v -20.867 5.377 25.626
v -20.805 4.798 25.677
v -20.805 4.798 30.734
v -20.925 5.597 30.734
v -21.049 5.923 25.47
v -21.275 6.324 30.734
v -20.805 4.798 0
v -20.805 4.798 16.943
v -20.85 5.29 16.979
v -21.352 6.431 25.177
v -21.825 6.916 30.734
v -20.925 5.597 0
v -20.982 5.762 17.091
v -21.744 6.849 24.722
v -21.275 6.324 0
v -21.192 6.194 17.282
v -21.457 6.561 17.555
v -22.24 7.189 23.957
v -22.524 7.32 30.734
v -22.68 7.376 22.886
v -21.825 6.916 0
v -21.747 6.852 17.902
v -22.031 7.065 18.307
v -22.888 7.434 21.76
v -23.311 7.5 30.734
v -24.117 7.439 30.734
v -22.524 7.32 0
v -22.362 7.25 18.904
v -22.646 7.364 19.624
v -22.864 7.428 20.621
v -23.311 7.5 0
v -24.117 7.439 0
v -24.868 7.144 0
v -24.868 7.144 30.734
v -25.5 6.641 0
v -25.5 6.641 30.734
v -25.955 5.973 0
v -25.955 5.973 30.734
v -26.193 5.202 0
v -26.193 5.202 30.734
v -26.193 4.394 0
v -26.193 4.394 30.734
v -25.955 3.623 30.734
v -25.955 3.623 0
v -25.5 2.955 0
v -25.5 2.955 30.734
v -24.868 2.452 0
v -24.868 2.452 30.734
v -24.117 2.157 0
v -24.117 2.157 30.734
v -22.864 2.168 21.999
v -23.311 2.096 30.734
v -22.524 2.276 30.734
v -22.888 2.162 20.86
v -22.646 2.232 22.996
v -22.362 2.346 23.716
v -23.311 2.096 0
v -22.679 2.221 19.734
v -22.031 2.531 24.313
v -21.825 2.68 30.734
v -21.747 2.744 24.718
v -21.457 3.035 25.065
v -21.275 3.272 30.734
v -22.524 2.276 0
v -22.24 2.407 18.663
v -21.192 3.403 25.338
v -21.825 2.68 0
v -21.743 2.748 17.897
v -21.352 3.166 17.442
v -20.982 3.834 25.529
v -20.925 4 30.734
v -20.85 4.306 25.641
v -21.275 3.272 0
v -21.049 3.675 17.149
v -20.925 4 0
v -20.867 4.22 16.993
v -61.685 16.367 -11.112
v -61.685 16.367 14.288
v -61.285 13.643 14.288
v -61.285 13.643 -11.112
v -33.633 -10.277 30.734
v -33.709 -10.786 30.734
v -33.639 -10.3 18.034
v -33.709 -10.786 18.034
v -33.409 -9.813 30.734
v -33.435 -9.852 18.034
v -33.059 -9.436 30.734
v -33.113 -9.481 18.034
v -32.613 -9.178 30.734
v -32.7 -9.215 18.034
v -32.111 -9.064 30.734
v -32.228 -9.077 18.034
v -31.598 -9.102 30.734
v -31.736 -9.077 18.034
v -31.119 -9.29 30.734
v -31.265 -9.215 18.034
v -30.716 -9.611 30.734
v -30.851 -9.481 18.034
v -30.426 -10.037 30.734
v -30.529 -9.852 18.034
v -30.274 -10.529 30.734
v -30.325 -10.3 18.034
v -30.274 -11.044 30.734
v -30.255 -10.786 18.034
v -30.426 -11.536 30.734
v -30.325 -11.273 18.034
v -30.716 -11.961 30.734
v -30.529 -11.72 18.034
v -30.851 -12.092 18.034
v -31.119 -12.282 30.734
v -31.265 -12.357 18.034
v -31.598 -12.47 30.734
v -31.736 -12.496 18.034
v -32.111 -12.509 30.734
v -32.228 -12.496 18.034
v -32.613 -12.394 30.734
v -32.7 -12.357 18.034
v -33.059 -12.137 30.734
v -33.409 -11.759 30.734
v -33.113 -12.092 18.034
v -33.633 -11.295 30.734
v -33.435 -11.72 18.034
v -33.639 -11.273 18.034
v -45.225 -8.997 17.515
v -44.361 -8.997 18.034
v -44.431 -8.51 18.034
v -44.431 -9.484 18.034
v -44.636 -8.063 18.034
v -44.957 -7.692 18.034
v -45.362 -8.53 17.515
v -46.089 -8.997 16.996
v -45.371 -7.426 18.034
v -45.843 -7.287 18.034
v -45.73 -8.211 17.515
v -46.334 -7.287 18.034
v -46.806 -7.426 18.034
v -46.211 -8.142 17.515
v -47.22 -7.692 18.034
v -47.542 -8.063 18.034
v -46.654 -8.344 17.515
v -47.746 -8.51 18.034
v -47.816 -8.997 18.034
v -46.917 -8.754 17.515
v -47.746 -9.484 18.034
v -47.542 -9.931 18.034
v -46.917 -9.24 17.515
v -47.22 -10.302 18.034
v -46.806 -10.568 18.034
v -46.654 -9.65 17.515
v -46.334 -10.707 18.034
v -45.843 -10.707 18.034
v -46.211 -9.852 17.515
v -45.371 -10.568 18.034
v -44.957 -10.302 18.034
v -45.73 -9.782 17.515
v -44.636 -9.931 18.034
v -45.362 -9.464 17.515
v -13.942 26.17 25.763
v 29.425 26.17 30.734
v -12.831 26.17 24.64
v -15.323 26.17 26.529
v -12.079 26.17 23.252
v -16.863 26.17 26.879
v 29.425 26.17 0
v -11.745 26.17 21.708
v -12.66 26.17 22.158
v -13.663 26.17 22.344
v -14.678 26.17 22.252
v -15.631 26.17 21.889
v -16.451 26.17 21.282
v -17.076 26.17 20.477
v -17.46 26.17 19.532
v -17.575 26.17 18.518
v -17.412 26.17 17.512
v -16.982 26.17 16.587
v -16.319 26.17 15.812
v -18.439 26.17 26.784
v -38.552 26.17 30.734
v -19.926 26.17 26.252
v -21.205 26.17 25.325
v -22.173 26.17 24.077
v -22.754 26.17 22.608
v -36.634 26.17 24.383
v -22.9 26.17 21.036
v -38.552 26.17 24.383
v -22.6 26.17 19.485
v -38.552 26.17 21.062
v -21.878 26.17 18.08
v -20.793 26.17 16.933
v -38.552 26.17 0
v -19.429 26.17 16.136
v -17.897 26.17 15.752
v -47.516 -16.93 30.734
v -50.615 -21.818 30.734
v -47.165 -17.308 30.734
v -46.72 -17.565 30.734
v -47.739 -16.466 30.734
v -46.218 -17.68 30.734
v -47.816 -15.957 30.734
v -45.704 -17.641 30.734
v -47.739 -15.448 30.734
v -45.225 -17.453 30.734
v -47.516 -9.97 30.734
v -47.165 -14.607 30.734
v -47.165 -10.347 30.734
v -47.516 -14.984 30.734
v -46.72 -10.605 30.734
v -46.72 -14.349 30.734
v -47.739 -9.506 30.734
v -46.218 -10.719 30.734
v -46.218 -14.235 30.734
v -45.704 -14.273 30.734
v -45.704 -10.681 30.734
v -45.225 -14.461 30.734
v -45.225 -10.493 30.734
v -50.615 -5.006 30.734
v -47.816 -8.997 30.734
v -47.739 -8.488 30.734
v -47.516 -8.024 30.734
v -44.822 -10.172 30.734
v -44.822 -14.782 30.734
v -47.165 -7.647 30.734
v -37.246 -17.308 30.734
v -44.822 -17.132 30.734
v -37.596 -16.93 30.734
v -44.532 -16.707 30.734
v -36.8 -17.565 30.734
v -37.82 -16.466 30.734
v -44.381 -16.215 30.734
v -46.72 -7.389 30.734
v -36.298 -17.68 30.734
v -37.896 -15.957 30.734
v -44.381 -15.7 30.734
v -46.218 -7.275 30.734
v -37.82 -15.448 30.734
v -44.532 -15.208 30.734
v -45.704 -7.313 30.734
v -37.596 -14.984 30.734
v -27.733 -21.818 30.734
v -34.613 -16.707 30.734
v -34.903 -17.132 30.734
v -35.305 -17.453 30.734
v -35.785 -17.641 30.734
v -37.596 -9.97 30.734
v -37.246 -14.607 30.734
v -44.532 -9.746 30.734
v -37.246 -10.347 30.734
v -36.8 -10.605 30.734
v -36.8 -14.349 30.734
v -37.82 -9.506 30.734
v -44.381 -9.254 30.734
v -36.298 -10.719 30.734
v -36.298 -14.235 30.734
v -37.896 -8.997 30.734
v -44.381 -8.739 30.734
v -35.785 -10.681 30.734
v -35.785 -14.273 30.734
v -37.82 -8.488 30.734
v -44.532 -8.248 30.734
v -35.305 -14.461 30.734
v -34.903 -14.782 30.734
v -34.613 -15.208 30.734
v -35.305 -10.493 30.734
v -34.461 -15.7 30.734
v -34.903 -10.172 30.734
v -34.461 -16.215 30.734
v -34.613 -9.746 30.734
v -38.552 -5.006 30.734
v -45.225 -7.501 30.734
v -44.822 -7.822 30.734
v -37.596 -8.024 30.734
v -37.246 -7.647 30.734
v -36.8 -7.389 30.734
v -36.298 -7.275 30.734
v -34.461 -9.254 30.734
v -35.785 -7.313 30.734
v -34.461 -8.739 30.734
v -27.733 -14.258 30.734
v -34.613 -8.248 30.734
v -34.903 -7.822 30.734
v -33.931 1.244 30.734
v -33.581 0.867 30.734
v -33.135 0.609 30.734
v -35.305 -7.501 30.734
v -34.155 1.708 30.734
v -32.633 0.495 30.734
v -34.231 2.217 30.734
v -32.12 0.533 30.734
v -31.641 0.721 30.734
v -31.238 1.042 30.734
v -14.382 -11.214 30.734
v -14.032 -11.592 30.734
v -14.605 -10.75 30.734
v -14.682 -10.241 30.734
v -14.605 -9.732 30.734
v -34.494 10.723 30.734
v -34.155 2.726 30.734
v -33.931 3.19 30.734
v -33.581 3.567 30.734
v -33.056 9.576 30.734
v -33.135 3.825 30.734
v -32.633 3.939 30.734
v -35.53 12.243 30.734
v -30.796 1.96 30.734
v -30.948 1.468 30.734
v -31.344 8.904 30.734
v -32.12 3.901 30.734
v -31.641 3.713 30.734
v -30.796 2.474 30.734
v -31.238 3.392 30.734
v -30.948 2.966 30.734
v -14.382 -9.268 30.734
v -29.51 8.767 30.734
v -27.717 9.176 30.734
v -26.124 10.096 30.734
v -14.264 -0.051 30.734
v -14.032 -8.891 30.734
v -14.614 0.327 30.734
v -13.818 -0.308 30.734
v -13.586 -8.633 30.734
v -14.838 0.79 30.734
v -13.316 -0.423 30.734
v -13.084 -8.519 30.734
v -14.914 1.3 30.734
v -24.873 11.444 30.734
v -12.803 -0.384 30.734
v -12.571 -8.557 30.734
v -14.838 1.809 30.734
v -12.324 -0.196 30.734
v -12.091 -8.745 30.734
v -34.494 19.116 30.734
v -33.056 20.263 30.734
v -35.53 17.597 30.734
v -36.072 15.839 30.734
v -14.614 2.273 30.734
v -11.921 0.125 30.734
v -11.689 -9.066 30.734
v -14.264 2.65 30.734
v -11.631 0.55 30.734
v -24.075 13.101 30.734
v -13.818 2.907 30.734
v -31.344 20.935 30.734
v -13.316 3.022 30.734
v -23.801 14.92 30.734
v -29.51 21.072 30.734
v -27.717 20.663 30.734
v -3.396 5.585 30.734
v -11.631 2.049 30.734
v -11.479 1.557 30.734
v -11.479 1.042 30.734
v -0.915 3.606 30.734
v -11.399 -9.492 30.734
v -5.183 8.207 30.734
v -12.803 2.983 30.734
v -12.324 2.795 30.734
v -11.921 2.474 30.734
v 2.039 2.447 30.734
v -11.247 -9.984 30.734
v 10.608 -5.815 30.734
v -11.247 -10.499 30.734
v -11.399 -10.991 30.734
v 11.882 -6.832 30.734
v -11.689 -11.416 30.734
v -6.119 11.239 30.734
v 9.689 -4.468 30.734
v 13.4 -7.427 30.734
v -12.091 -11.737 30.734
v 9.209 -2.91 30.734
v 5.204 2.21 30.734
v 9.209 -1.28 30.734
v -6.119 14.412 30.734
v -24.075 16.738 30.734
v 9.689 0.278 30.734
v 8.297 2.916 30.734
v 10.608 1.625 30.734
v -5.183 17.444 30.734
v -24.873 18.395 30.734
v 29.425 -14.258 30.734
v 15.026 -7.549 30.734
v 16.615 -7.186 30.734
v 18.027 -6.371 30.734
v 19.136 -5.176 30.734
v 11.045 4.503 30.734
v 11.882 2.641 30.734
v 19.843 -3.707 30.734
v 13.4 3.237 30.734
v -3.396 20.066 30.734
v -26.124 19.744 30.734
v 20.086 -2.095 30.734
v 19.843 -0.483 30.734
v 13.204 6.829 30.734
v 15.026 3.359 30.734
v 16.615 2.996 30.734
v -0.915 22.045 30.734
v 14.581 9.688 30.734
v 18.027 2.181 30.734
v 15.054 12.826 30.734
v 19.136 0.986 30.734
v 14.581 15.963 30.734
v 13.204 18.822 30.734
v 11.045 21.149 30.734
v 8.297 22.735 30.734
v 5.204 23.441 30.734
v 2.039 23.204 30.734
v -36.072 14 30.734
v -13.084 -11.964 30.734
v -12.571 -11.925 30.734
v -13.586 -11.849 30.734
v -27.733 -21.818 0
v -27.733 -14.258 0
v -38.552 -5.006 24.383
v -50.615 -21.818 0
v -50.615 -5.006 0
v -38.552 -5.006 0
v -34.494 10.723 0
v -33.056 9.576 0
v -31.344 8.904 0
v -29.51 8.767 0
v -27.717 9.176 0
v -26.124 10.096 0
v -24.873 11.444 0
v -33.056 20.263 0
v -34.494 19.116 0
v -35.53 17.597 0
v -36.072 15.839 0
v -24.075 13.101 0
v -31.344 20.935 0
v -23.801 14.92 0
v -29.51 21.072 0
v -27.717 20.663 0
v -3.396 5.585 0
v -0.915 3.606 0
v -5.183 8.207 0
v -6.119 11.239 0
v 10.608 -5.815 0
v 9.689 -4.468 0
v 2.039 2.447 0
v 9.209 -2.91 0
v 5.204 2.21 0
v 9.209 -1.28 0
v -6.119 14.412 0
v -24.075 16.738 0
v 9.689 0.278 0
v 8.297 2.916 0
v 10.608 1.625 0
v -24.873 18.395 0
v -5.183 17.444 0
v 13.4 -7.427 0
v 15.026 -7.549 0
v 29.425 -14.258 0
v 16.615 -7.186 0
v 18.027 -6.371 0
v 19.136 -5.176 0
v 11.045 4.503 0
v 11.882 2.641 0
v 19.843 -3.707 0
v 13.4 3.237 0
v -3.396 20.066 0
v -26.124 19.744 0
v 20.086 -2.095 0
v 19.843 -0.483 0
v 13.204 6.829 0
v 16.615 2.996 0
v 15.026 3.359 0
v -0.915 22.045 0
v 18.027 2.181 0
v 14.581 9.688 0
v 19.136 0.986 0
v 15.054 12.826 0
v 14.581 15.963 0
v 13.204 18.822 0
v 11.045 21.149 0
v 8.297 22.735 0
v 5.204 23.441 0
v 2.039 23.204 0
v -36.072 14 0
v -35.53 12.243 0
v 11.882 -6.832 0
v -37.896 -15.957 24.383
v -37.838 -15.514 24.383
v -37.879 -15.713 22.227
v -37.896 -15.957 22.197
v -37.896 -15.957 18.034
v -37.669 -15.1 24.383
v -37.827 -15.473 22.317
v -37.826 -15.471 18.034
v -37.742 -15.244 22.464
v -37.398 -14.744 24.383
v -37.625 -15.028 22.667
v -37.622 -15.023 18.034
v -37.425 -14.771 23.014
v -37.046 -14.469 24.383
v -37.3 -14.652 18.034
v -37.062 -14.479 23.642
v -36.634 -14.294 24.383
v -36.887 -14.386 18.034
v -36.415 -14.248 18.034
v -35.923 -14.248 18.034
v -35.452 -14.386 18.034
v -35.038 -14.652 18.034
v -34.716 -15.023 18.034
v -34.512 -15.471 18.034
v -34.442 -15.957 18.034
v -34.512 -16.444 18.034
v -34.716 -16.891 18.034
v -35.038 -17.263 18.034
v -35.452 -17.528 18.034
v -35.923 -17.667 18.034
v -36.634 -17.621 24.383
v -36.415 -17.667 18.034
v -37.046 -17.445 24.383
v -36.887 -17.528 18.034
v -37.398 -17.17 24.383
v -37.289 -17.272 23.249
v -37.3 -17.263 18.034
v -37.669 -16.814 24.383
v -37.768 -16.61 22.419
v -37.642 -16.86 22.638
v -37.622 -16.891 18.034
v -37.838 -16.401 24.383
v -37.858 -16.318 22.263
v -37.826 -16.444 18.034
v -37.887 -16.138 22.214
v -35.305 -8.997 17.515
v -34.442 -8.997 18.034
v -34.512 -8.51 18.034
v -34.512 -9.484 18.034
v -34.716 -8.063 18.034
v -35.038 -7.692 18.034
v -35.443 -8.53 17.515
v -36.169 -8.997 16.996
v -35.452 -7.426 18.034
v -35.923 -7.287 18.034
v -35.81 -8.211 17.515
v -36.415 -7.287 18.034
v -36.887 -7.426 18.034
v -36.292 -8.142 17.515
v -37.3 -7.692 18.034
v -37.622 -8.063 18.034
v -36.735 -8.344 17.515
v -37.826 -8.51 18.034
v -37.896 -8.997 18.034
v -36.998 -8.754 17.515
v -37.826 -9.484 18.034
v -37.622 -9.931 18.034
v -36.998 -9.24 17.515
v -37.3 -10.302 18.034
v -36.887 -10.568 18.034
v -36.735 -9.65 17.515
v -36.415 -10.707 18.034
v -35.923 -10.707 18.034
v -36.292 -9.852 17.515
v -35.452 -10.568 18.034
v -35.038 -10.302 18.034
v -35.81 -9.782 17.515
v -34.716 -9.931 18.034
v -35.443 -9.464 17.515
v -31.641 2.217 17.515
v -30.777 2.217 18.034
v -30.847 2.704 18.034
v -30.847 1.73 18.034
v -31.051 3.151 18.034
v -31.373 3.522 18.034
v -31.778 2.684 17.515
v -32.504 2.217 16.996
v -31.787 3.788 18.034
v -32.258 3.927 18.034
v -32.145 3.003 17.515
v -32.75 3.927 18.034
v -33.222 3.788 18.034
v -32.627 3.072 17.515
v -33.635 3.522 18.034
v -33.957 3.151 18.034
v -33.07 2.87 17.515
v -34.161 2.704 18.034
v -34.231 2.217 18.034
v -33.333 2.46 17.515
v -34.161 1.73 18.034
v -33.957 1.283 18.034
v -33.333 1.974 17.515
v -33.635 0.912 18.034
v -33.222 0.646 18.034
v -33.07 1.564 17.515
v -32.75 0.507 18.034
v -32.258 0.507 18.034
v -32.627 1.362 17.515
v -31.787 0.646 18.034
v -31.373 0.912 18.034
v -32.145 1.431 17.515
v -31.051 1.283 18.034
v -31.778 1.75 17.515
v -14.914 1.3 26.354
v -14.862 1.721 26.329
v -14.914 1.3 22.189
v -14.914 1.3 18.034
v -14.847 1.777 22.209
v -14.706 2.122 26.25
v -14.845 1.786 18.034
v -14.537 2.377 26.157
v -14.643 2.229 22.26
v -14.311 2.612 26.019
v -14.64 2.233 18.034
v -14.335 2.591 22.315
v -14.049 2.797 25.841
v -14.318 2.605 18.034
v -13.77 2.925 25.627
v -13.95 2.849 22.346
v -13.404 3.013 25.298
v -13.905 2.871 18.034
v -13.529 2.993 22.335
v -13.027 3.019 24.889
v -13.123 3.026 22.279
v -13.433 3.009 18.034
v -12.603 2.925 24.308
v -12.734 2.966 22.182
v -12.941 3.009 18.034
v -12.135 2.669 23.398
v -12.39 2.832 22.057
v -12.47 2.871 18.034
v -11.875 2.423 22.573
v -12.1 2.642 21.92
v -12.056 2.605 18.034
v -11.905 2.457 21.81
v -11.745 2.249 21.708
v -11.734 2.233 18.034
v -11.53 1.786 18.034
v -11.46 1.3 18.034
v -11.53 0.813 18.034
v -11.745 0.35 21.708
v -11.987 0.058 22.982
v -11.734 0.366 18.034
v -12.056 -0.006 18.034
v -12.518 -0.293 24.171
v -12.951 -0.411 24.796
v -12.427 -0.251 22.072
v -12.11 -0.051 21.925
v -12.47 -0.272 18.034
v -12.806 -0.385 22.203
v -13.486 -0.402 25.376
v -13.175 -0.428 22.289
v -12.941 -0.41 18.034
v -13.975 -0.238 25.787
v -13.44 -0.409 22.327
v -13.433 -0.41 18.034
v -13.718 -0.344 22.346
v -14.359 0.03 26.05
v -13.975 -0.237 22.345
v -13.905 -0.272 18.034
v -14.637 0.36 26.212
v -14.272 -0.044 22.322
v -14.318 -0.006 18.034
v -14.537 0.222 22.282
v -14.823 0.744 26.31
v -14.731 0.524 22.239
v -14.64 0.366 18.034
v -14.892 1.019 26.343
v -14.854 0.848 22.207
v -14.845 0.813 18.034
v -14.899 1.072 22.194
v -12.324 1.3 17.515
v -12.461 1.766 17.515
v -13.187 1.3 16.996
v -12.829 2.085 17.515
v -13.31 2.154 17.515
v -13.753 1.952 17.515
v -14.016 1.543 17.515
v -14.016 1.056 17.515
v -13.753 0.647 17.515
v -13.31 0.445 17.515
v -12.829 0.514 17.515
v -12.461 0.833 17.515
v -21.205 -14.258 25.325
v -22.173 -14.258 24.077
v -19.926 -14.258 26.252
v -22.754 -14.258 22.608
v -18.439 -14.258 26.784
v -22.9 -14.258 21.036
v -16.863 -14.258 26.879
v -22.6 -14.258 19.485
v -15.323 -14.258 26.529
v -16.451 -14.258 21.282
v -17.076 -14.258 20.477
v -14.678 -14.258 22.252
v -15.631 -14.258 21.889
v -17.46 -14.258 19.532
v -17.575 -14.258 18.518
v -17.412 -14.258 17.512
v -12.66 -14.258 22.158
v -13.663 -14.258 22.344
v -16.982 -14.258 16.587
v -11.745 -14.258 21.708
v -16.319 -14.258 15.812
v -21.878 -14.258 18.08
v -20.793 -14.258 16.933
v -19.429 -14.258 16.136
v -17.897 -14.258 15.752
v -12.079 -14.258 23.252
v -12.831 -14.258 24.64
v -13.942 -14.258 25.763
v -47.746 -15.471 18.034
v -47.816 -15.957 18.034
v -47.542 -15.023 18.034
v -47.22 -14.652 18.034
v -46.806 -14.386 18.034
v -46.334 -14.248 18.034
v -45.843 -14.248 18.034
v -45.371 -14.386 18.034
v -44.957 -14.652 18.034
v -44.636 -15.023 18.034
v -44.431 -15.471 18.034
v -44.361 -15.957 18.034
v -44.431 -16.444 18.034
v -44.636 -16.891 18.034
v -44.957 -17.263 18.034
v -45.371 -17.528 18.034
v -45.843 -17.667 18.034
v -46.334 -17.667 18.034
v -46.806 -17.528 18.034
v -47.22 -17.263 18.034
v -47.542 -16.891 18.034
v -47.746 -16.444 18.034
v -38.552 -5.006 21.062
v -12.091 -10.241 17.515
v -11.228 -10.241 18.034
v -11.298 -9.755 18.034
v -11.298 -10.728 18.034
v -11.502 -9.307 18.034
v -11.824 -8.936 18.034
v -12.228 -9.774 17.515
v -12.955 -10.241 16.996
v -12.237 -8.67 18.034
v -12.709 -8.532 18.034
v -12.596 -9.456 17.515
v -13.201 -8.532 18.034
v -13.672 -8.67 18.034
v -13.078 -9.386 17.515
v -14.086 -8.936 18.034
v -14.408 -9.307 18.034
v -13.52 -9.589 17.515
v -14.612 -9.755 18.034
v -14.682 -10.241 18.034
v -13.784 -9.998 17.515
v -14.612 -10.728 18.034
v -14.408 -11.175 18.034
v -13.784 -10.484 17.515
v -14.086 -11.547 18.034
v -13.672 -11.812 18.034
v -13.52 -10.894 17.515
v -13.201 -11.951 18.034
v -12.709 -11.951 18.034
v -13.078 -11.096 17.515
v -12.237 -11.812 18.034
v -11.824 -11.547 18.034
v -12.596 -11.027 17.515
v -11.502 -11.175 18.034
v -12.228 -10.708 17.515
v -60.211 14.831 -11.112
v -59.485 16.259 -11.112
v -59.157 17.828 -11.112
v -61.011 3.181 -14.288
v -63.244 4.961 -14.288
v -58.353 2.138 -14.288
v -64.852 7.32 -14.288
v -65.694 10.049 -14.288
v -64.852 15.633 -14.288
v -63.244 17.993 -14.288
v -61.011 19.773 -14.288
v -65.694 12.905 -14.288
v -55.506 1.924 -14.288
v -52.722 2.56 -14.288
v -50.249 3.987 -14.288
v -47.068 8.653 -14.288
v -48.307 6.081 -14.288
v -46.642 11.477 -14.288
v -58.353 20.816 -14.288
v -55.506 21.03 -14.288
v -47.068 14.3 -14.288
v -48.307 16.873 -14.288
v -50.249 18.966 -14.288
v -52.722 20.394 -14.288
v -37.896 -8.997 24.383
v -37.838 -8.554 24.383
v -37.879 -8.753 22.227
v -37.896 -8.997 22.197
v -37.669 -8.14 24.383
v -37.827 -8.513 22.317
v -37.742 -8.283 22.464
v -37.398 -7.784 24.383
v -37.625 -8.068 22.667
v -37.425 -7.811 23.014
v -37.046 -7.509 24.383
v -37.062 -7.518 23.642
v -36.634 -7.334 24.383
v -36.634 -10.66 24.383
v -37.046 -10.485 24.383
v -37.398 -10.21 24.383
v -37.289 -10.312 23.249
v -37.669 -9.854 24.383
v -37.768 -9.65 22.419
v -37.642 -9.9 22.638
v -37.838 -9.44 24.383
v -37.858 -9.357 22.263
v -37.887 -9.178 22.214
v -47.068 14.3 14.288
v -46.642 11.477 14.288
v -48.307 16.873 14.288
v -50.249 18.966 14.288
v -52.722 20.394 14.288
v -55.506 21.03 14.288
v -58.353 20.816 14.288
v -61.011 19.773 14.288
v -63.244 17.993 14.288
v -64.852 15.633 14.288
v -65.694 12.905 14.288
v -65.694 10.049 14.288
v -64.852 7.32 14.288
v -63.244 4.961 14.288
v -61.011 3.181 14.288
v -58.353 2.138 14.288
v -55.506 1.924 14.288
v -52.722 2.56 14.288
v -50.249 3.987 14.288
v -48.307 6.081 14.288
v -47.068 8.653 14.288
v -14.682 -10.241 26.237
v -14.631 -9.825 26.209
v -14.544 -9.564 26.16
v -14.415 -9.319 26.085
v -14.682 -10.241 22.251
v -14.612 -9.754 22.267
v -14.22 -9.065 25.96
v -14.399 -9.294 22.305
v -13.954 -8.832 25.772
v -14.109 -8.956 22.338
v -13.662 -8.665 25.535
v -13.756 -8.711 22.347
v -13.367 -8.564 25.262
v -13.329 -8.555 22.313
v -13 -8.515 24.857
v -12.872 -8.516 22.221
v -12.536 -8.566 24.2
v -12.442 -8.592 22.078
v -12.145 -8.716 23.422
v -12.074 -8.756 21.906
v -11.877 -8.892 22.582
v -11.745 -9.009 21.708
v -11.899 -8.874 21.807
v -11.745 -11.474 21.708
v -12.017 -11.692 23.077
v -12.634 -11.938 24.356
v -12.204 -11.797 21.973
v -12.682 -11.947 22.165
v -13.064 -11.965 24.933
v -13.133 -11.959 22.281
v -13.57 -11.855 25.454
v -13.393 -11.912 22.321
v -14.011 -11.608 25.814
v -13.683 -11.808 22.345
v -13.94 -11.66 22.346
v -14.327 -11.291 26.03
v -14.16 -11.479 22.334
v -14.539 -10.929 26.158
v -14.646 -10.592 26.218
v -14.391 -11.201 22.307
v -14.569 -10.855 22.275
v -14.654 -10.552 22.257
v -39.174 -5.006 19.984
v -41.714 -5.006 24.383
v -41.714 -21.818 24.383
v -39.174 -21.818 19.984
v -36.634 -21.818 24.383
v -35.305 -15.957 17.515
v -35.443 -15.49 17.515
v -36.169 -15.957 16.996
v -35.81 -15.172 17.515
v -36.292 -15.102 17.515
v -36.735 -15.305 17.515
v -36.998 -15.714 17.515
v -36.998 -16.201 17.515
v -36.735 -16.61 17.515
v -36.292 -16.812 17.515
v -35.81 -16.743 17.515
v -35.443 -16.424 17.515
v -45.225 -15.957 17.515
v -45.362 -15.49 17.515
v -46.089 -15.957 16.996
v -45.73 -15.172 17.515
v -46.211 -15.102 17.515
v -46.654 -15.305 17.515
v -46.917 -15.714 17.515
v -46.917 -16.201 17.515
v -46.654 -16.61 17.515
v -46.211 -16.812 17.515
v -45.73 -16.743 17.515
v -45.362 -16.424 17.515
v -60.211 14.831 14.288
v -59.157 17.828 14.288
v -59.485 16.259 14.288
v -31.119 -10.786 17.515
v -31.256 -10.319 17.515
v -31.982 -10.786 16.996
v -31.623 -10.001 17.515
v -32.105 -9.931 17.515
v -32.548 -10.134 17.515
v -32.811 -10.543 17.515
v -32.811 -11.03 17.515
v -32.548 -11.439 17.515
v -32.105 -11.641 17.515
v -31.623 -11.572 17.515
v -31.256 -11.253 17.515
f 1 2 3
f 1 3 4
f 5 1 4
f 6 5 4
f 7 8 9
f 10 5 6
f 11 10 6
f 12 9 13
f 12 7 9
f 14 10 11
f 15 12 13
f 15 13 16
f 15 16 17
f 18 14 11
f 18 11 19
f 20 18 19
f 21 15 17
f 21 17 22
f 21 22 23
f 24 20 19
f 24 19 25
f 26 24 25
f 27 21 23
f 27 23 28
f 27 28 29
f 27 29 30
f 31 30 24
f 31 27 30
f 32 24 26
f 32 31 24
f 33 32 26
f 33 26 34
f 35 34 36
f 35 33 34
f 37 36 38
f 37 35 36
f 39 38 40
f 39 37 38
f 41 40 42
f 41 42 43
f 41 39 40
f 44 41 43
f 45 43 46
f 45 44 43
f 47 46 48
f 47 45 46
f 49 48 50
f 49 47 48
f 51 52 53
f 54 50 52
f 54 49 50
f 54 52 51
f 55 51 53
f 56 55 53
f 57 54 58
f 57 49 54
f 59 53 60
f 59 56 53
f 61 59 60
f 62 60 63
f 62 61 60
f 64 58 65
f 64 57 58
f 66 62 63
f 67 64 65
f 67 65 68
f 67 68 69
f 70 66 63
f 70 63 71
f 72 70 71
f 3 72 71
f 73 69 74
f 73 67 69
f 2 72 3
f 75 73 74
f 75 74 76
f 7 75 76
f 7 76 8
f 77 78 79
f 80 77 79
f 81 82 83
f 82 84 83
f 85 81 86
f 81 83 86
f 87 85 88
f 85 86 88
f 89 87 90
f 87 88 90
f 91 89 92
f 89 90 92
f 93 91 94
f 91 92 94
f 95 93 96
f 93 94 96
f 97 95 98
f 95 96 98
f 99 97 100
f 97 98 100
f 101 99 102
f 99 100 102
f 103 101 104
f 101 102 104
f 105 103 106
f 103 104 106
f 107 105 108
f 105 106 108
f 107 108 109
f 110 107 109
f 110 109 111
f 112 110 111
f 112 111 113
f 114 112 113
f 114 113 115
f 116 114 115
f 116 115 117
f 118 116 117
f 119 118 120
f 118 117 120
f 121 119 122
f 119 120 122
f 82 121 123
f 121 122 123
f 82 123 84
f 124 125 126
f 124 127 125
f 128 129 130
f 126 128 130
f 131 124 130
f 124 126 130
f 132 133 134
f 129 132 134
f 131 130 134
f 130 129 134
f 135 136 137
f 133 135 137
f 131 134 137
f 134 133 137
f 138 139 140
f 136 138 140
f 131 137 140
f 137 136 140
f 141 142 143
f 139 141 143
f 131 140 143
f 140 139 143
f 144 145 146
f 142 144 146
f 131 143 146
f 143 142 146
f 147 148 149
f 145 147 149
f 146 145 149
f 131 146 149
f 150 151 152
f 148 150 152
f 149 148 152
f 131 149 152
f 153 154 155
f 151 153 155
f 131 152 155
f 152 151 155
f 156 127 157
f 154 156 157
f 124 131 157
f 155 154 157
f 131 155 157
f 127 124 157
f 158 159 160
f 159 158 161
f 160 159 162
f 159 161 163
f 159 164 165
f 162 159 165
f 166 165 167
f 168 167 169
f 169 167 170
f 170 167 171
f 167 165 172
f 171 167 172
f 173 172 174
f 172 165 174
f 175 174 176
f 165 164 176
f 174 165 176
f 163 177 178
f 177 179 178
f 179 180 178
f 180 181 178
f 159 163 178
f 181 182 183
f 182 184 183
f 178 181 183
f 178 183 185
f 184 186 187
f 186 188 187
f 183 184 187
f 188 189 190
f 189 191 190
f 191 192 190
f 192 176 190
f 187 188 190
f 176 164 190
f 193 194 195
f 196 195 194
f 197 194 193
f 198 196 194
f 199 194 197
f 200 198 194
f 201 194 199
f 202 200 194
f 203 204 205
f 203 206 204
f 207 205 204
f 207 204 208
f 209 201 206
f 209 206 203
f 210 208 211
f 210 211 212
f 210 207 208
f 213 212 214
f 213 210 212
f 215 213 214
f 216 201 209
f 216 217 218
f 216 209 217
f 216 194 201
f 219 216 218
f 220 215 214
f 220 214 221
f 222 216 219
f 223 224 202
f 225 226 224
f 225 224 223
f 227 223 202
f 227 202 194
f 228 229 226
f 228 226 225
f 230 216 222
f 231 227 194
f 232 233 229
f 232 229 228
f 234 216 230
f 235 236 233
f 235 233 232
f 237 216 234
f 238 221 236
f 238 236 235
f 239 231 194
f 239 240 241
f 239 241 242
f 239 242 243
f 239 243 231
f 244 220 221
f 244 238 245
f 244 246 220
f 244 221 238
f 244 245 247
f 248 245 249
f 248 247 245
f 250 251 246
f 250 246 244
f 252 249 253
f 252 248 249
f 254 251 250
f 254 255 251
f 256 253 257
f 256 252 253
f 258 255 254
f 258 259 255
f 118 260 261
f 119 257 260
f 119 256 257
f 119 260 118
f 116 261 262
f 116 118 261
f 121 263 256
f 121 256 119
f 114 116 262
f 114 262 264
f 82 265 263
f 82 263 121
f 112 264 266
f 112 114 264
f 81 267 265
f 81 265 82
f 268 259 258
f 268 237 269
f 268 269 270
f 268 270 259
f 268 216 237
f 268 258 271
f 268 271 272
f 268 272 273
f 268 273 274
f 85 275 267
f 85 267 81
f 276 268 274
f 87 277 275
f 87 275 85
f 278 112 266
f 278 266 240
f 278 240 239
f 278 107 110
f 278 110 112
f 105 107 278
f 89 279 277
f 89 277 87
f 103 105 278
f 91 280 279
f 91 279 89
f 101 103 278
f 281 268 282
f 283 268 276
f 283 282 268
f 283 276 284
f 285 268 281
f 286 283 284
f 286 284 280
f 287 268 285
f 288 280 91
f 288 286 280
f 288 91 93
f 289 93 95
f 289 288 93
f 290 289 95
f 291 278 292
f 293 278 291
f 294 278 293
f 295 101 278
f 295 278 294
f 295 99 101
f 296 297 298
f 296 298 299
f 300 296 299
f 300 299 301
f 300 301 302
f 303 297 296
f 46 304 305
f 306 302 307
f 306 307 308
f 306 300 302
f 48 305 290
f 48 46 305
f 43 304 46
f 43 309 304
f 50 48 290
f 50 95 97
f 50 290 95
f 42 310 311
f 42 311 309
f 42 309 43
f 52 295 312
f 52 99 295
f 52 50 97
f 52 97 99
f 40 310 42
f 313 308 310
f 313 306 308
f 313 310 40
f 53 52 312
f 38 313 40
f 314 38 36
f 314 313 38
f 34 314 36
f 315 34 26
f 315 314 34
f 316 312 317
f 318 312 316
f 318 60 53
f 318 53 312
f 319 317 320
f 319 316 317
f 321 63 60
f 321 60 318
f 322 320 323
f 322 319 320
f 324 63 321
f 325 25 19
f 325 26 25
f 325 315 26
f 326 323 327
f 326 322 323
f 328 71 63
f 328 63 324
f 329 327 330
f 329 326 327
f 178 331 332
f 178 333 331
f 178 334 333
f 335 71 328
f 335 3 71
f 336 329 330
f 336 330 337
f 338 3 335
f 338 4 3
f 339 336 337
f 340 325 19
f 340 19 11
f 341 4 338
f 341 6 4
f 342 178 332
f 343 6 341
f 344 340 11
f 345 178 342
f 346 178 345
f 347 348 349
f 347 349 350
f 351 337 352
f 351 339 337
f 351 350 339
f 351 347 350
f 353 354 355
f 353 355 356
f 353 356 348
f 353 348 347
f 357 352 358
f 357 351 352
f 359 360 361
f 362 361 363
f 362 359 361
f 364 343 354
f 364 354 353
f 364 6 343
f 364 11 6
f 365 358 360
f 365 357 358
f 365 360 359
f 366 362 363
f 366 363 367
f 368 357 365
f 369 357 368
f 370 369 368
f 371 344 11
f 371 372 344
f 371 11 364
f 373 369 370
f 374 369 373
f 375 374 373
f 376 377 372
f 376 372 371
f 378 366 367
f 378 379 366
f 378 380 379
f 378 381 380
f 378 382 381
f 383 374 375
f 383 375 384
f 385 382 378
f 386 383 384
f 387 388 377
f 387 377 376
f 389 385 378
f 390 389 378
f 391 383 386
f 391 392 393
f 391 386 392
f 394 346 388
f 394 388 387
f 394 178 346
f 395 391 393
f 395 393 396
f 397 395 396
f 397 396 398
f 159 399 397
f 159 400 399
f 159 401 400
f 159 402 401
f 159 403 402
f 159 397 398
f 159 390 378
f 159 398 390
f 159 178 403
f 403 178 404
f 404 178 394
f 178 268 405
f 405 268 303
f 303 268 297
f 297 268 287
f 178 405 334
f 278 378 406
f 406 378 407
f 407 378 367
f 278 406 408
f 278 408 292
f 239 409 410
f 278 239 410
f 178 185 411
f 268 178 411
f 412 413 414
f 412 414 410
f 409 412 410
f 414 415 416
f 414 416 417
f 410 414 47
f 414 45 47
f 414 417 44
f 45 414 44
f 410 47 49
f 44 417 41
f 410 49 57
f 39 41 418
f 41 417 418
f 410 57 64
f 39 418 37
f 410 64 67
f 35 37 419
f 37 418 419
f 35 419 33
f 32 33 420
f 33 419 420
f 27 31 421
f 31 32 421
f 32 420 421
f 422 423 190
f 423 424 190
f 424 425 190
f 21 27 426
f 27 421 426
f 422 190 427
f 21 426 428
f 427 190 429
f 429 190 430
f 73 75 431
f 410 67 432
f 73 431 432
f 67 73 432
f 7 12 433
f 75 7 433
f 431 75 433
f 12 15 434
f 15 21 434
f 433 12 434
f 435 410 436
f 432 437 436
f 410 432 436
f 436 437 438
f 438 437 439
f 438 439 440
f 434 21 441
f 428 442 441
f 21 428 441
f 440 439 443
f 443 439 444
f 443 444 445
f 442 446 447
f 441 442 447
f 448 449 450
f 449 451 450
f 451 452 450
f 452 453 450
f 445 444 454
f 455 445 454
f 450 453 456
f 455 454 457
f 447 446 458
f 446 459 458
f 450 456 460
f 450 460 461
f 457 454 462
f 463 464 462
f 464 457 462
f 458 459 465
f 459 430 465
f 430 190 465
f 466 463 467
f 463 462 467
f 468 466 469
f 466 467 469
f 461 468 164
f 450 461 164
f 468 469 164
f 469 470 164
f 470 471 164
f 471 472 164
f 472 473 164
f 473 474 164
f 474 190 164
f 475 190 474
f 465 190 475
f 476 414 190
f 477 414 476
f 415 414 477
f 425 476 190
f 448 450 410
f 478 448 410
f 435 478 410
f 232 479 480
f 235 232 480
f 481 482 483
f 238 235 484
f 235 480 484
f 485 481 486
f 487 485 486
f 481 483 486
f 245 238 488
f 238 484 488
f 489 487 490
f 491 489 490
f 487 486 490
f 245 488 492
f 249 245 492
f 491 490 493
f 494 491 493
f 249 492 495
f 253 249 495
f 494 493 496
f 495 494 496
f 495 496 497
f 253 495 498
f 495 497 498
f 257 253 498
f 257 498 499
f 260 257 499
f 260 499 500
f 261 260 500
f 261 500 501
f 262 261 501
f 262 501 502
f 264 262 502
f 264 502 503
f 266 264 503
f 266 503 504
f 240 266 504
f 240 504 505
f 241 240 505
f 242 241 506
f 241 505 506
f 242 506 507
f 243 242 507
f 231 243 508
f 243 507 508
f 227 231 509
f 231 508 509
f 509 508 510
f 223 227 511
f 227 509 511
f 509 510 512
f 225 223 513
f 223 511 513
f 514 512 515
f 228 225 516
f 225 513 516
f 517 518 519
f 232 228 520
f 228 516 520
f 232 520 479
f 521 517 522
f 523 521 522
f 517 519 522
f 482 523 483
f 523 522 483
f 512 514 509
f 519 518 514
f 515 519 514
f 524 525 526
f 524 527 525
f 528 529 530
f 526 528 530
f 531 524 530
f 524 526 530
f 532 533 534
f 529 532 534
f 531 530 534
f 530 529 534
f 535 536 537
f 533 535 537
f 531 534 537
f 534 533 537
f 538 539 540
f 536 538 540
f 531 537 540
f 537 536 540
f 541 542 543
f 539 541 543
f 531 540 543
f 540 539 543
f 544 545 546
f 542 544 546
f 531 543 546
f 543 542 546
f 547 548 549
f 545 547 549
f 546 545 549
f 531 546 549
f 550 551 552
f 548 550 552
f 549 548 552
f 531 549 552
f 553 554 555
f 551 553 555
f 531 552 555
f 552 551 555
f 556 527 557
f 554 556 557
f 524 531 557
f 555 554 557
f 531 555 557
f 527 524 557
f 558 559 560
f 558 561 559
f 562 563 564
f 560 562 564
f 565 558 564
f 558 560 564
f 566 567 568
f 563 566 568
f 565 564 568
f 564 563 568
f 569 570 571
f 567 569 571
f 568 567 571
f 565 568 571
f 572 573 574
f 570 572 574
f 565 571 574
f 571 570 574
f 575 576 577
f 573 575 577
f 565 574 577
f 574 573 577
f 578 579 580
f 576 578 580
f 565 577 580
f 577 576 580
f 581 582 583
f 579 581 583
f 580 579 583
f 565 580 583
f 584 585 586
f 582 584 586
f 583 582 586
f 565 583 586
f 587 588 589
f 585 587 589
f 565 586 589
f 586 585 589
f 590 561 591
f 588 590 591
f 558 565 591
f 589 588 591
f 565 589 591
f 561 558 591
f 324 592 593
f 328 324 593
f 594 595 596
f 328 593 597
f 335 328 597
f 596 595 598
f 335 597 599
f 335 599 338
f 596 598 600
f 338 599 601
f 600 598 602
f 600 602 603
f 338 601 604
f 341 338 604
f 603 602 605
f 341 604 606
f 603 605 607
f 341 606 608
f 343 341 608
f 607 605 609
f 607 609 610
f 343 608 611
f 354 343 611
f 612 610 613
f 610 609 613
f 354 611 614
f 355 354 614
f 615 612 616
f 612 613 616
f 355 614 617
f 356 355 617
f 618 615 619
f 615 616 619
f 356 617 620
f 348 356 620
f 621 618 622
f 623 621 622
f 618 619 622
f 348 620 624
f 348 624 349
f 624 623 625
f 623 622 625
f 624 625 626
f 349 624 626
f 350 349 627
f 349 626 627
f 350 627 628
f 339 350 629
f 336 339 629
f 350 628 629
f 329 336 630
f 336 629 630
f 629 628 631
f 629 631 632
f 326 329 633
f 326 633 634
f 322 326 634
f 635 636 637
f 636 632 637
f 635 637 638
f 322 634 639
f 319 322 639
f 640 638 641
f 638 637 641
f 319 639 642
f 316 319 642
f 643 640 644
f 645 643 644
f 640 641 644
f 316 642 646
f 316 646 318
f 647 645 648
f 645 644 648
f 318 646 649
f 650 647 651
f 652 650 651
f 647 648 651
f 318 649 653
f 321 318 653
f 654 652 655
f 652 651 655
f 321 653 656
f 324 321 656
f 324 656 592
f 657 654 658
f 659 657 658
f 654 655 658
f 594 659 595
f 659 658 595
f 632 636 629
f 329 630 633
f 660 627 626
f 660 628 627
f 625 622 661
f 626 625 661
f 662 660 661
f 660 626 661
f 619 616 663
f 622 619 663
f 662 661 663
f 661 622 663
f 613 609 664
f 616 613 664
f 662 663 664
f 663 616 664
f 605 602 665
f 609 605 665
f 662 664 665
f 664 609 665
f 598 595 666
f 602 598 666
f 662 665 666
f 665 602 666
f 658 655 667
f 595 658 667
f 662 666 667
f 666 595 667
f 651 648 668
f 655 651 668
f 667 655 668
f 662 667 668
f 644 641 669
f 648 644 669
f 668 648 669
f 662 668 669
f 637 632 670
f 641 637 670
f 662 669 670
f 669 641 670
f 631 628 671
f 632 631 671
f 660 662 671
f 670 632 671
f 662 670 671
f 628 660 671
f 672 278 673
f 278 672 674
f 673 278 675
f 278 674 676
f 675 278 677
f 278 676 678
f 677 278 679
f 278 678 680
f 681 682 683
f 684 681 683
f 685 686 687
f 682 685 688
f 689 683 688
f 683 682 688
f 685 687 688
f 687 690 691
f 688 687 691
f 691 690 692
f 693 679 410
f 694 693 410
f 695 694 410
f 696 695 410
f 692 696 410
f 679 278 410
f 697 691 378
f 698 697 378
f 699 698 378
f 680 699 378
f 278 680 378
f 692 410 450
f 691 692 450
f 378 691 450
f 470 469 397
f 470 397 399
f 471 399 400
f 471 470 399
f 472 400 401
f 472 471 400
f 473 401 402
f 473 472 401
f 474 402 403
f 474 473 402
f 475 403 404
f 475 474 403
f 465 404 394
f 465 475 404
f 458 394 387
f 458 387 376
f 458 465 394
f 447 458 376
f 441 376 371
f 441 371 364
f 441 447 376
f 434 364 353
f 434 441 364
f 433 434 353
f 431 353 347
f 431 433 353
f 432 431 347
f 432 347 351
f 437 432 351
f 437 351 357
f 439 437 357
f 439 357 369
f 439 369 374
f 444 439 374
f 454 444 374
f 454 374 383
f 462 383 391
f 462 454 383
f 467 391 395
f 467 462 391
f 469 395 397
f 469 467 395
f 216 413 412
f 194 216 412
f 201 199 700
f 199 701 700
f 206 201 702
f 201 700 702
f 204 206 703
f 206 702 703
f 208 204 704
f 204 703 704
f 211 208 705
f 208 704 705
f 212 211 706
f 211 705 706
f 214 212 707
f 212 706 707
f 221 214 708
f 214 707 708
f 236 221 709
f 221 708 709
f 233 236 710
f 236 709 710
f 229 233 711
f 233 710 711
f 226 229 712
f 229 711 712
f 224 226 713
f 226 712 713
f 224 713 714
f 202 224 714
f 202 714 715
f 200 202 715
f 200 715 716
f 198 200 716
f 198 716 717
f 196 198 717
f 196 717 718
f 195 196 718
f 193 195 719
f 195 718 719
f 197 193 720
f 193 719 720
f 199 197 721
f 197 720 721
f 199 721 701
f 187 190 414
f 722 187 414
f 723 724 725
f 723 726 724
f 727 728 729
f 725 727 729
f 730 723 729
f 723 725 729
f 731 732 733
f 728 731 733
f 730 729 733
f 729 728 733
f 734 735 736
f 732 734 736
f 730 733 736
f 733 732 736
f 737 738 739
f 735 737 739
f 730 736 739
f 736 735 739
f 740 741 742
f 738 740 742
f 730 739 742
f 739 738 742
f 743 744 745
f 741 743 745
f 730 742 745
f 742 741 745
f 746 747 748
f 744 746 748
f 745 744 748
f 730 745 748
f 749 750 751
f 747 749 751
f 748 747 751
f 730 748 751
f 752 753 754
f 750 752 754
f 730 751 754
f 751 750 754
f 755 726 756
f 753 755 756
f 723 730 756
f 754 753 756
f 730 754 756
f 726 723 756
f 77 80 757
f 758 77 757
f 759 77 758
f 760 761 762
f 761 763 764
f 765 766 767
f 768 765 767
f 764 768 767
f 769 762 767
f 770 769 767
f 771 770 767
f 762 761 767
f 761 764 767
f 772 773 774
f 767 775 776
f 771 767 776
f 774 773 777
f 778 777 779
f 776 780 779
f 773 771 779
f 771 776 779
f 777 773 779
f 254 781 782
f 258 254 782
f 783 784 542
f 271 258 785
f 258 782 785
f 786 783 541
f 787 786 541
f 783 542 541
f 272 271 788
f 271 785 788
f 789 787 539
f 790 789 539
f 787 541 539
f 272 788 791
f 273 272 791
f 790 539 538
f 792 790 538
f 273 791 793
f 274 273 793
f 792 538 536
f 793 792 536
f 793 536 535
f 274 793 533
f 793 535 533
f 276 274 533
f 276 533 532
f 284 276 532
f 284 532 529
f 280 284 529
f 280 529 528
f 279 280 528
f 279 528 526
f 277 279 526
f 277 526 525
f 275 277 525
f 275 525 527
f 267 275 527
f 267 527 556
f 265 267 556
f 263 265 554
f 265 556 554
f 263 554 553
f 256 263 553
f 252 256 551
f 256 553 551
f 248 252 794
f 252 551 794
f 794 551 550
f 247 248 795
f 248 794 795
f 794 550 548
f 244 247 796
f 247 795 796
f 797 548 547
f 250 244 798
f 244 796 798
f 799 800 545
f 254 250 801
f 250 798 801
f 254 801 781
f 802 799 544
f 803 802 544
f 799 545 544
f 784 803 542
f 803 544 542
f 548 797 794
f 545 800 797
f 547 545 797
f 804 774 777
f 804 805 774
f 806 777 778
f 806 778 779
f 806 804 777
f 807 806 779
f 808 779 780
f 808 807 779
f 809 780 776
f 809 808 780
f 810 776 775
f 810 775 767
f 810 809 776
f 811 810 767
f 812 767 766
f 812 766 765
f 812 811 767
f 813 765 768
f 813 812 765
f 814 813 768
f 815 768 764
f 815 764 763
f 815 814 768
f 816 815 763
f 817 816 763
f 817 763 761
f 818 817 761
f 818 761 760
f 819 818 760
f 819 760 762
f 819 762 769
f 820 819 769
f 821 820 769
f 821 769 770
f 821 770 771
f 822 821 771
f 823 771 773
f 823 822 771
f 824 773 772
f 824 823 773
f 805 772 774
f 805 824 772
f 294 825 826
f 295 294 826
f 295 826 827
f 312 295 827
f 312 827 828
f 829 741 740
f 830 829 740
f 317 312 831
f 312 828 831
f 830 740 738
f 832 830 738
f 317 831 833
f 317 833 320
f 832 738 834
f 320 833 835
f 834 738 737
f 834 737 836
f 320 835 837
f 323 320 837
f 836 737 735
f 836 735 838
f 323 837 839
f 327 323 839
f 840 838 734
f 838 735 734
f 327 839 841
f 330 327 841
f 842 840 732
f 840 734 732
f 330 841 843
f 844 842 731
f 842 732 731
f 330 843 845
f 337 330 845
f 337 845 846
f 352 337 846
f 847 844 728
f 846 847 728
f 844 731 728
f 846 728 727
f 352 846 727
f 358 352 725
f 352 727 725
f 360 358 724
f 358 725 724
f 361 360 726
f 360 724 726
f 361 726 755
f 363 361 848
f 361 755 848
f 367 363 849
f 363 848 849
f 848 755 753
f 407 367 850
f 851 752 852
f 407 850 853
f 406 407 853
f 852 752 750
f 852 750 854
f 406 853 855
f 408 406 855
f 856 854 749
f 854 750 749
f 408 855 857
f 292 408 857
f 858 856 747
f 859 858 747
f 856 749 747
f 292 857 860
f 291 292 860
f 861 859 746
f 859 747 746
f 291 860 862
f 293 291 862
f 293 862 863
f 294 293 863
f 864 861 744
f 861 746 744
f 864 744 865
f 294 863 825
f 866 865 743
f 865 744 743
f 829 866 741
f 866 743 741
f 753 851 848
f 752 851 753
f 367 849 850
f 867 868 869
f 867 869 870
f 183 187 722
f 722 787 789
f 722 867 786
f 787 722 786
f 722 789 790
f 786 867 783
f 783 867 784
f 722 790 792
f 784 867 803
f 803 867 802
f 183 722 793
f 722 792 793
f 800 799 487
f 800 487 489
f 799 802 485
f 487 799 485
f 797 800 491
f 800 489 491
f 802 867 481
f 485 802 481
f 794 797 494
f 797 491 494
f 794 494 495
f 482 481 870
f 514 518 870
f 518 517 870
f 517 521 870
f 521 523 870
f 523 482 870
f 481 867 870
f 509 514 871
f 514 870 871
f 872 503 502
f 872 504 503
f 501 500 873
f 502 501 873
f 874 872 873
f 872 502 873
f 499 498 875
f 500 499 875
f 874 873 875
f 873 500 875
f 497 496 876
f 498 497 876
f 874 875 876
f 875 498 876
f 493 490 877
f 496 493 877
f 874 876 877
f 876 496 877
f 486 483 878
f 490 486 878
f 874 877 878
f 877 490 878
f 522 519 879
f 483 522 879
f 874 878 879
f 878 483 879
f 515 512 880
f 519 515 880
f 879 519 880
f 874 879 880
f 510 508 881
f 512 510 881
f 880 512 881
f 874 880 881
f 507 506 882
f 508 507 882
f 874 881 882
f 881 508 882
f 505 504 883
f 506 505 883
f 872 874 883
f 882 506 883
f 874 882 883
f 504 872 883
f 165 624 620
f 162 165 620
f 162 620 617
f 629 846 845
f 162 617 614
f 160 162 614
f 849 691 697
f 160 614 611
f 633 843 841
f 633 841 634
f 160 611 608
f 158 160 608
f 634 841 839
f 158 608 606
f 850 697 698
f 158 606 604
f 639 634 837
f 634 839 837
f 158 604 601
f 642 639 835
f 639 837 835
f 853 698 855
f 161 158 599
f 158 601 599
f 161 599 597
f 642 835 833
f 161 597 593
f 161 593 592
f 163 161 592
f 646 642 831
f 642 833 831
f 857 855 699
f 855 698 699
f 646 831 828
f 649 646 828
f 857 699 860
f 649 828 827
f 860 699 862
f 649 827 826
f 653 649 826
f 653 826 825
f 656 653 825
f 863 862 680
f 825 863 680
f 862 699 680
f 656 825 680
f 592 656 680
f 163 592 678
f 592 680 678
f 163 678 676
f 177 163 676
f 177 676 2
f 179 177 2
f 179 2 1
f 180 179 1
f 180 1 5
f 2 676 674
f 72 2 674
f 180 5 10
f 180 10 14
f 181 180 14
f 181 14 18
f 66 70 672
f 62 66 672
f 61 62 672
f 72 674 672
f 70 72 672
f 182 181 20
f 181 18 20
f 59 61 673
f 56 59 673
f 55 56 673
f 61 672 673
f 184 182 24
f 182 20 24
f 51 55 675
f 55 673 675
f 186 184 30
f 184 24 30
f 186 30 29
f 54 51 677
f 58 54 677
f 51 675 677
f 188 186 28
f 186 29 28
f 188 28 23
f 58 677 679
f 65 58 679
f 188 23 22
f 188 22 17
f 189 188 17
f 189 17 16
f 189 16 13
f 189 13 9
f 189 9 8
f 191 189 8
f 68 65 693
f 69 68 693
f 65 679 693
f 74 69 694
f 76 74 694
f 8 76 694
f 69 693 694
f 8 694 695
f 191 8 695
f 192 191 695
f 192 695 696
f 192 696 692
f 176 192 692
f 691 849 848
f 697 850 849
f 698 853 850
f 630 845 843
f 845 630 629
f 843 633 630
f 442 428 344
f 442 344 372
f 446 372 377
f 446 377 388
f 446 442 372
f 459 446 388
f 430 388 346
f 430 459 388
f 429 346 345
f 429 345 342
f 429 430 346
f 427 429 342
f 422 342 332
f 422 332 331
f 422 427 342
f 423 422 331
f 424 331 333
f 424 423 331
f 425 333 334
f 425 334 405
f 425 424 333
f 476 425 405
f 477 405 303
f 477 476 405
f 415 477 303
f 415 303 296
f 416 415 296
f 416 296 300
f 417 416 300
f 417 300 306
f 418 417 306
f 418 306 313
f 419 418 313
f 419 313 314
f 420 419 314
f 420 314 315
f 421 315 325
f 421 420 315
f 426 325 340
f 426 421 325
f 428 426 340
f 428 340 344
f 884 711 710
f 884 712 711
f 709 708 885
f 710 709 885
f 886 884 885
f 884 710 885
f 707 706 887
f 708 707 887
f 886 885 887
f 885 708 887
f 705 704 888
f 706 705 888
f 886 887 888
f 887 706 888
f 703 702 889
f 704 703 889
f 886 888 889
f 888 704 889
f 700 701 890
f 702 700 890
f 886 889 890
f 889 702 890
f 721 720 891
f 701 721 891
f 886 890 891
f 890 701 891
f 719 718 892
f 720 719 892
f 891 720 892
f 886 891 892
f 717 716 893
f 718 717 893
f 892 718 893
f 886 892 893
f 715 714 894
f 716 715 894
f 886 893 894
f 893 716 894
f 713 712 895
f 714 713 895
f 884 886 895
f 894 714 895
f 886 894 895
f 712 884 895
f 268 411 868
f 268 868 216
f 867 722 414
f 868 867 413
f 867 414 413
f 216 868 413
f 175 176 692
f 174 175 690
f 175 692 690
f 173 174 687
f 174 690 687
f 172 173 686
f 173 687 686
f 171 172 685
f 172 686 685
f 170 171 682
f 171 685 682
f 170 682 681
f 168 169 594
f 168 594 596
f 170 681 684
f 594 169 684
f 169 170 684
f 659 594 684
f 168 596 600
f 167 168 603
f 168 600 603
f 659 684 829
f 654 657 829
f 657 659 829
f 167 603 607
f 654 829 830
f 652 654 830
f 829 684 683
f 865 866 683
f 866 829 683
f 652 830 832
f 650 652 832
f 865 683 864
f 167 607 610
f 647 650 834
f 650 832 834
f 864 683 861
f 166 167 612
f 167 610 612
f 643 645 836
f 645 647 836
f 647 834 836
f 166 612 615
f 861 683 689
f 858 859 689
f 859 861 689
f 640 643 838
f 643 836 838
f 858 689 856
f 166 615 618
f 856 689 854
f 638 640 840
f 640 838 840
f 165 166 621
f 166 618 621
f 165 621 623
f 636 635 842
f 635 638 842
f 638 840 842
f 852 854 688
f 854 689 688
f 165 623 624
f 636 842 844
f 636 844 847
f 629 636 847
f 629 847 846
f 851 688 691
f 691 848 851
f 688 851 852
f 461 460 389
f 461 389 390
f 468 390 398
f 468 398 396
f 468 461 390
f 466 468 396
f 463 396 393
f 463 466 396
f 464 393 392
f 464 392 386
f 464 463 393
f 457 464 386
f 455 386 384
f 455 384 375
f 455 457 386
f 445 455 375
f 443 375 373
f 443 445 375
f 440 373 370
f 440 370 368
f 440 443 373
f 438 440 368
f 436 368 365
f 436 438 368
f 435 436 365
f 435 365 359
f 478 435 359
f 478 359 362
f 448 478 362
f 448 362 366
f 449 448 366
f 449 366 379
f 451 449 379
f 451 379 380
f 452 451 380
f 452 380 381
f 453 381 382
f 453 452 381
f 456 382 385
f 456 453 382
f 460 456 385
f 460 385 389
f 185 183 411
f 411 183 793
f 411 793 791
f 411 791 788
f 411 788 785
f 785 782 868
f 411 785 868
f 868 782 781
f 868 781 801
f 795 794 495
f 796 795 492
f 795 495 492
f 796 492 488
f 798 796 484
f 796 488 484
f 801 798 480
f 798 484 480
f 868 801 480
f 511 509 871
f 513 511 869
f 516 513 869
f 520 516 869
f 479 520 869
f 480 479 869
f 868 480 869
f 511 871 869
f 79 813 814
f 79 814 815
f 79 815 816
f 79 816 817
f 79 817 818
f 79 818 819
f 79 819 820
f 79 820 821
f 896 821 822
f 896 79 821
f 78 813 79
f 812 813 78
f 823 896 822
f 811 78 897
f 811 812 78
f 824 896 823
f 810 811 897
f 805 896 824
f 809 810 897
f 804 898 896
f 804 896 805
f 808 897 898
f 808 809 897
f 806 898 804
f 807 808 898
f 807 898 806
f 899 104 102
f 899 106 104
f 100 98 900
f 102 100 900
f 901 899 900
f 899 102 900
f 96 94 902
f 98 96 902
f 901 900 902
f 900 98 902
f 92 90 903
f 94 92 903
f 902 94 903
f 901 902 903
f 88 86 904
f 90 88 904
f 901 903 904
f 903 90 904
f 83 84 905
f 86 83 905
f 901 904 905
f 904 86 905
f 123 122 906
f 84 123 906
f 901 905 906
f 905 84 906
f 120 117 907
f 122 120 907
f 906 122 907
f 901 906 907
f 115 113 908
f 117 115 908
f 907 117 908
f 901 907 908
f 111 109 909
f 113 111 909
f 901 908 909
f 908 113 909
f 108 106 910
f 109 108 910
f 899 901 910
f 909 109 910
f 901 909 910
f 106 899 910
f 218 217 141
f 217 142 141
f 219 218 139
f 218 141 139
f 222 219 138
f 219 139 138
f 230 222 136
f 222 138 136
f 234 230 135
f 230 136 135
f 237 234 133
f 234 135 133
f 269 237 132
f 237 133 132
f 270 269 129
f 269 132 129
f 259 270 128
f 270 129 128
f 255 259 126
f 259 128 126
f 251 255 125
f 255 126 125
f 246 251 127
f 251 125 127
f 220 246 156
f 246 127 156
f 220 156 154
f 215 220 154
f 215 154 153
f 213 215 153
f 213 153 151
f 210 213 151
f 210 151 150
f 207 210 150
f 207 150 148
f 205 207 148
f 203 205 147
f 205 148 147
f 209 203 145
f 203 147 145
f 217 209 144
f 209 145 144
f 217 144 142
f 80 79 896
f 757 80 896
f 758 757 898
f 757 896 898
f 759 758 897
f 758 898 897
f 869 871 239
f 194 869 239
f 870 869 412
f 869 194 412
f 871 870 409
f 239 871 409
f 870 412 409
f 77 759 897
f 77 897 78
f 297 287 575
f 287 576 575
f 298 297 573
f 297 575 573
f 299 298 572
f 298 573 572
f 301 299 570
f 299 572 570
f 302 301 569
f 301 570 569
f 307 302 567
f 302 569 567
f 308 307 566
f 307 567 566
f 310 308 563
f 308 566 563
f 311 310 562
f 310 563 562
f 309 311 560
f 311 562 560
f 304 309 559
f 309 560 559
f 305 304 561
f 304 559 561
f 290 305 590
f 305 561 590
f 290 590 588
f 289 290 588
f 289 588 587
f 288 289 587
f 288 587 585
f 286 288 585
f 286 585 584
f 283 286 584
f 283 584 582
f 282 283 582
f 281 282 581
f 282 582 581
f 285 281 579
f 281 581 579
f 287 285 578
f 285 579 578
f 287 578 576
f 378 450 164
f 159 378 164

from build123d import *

# Parameters (mm, degrees)
F0_R      = 5.4693390269
F0_R_2    = 2.7091456529
F0_R_3    = 6.1699110027
F0_R_4    = 10.6455543831
F1_DEPTH  = 30.734
F3_DEPTH  = 47.9885970632
F5_DEPTH  = 40.4286065528
F6_R      = 9.5794837086
F7_DEPTH  = 14.2875
F9_DEPTH  = 25.4
F11_D     = 3.4544
F11_DEPTH = 12.7
F11_TIP   = 1.0378064612


with BuildPart() as f1:
    # F0 (on Top) → F1 (new body)
    with BuildSketch(Plane.XY):
        Polygon((29.4250566512, 26.1695962399), (-38.552004844, 26.1695962399), (-38.552004844, -5.0064995885), (-50.6152287126, -5.0064995885), (-50.6152287126, -21.8180008233), (-27.7334339917, -21.8180008233), (-27.7334339917, -14.2580103129), (29.4250566512, -14.2580103129), align=None)
        with Locations((14.6169317886, -2.0951619372)):
            Circle(F0_R, mode=Mode.SUBTRACT)
        with Locations((-23.5138162971, 4.798039794)):
            Circle(F0_R_2, mode=Mode.SUBTRACT)
        with Locations((-29.9707390368, 14.919702895)):
            Circle(F0_R_3, mode=Mode.SUBTRACT)
        with Locations((4.4080126099, 12.825566344)):
            Circle(F0_R_4, mode=Mode.SUBTRACT)
    extrude(amount=F1_DEPTH)

    # F2 (on face) → F3 (cut, through all)
    with BuildSketch(Plane.XZ.offset(21.8180008233)):
        Polygon((-39.1743313521, 19.9836234878), (-36.6343313521, 24.383032539), (-41.7143313521, 24.383032539), align=None)
    extrude(amount=-F3_DEPTH, mode=Mode.SUBTRACT)

    # F4 (on face) → F5 (cut, through all)
    with BuildSketch(Plane.XZ.offset(14.2580103129)):
        with BuildLine():
            ThreePointArc((-16.3189860749, 15.8121321819), (-16.7910518212, 20.9007865676), (-11.7446851809, 21.7079007223))
            ThreePointArc((-11.7446851809, 21.7079007223), (-21.7334437692, 24.7353990954), (-16.3189860749, 15.8121321819))
        make_face()
    extrude(amount=-F5_DEPTH, mode=Mode.SUBTRACT)

    # F11
    with Locations(Plane.XY.offset(30.734)):
        with Locations((-46.0885278881, -8.9969150722), (-46.0885278881, -15.957230702), (-36.1690670252, -8.9969150722), (-36.1690670252, -15.957230702), (-31.9821573794, -10.7862399891), (-32.5041748583, 2.2169682197), (-13.1872687489, 1.299540163), (-12.9549028352, -10.2411890402)):
            Hole(F11_D / 2, depth=F11_DEPTH)
            with Locations((0, 0, -(F11_DEPTH + F11_TIP / 2))):  # 118° drill point
                Cone(0, F11_D / 2, F11_TIP, mode=Mode.SUBTRACT)


with BuildPart() as f7:
    # F6 (on Top) → F7 (new body, symmetric)
    with BuildSketch(Plane.XY):
        with Locations((-56.2216639519, 11.4768818021)):
            Circle(F6_R)
    extrude(amount=F7_DEPTH, both=True)

    # F8 (on face) → F9 (cut)
    with BuildSketch(Plane.XY.offset(14.2875)):
        with BuildLine():
            Line((-61.684911138, 16.3667645872), (-61.2852904338, 13.6428180285))
            ThreePointArc((-61.2852904338, 13.6428180285), (-59.800605963, 15.5213294517), (-59.1570255087, 17.8276029272))
            Line((-59.1570255087, 17.8276029272), (-61.684911138, 16.3667645872))
        make_face()
    extrude(amount=-F9_DEPTH, mode=Mode.SUBTRACT)


solid = Compound([f1.part, f7.part])
